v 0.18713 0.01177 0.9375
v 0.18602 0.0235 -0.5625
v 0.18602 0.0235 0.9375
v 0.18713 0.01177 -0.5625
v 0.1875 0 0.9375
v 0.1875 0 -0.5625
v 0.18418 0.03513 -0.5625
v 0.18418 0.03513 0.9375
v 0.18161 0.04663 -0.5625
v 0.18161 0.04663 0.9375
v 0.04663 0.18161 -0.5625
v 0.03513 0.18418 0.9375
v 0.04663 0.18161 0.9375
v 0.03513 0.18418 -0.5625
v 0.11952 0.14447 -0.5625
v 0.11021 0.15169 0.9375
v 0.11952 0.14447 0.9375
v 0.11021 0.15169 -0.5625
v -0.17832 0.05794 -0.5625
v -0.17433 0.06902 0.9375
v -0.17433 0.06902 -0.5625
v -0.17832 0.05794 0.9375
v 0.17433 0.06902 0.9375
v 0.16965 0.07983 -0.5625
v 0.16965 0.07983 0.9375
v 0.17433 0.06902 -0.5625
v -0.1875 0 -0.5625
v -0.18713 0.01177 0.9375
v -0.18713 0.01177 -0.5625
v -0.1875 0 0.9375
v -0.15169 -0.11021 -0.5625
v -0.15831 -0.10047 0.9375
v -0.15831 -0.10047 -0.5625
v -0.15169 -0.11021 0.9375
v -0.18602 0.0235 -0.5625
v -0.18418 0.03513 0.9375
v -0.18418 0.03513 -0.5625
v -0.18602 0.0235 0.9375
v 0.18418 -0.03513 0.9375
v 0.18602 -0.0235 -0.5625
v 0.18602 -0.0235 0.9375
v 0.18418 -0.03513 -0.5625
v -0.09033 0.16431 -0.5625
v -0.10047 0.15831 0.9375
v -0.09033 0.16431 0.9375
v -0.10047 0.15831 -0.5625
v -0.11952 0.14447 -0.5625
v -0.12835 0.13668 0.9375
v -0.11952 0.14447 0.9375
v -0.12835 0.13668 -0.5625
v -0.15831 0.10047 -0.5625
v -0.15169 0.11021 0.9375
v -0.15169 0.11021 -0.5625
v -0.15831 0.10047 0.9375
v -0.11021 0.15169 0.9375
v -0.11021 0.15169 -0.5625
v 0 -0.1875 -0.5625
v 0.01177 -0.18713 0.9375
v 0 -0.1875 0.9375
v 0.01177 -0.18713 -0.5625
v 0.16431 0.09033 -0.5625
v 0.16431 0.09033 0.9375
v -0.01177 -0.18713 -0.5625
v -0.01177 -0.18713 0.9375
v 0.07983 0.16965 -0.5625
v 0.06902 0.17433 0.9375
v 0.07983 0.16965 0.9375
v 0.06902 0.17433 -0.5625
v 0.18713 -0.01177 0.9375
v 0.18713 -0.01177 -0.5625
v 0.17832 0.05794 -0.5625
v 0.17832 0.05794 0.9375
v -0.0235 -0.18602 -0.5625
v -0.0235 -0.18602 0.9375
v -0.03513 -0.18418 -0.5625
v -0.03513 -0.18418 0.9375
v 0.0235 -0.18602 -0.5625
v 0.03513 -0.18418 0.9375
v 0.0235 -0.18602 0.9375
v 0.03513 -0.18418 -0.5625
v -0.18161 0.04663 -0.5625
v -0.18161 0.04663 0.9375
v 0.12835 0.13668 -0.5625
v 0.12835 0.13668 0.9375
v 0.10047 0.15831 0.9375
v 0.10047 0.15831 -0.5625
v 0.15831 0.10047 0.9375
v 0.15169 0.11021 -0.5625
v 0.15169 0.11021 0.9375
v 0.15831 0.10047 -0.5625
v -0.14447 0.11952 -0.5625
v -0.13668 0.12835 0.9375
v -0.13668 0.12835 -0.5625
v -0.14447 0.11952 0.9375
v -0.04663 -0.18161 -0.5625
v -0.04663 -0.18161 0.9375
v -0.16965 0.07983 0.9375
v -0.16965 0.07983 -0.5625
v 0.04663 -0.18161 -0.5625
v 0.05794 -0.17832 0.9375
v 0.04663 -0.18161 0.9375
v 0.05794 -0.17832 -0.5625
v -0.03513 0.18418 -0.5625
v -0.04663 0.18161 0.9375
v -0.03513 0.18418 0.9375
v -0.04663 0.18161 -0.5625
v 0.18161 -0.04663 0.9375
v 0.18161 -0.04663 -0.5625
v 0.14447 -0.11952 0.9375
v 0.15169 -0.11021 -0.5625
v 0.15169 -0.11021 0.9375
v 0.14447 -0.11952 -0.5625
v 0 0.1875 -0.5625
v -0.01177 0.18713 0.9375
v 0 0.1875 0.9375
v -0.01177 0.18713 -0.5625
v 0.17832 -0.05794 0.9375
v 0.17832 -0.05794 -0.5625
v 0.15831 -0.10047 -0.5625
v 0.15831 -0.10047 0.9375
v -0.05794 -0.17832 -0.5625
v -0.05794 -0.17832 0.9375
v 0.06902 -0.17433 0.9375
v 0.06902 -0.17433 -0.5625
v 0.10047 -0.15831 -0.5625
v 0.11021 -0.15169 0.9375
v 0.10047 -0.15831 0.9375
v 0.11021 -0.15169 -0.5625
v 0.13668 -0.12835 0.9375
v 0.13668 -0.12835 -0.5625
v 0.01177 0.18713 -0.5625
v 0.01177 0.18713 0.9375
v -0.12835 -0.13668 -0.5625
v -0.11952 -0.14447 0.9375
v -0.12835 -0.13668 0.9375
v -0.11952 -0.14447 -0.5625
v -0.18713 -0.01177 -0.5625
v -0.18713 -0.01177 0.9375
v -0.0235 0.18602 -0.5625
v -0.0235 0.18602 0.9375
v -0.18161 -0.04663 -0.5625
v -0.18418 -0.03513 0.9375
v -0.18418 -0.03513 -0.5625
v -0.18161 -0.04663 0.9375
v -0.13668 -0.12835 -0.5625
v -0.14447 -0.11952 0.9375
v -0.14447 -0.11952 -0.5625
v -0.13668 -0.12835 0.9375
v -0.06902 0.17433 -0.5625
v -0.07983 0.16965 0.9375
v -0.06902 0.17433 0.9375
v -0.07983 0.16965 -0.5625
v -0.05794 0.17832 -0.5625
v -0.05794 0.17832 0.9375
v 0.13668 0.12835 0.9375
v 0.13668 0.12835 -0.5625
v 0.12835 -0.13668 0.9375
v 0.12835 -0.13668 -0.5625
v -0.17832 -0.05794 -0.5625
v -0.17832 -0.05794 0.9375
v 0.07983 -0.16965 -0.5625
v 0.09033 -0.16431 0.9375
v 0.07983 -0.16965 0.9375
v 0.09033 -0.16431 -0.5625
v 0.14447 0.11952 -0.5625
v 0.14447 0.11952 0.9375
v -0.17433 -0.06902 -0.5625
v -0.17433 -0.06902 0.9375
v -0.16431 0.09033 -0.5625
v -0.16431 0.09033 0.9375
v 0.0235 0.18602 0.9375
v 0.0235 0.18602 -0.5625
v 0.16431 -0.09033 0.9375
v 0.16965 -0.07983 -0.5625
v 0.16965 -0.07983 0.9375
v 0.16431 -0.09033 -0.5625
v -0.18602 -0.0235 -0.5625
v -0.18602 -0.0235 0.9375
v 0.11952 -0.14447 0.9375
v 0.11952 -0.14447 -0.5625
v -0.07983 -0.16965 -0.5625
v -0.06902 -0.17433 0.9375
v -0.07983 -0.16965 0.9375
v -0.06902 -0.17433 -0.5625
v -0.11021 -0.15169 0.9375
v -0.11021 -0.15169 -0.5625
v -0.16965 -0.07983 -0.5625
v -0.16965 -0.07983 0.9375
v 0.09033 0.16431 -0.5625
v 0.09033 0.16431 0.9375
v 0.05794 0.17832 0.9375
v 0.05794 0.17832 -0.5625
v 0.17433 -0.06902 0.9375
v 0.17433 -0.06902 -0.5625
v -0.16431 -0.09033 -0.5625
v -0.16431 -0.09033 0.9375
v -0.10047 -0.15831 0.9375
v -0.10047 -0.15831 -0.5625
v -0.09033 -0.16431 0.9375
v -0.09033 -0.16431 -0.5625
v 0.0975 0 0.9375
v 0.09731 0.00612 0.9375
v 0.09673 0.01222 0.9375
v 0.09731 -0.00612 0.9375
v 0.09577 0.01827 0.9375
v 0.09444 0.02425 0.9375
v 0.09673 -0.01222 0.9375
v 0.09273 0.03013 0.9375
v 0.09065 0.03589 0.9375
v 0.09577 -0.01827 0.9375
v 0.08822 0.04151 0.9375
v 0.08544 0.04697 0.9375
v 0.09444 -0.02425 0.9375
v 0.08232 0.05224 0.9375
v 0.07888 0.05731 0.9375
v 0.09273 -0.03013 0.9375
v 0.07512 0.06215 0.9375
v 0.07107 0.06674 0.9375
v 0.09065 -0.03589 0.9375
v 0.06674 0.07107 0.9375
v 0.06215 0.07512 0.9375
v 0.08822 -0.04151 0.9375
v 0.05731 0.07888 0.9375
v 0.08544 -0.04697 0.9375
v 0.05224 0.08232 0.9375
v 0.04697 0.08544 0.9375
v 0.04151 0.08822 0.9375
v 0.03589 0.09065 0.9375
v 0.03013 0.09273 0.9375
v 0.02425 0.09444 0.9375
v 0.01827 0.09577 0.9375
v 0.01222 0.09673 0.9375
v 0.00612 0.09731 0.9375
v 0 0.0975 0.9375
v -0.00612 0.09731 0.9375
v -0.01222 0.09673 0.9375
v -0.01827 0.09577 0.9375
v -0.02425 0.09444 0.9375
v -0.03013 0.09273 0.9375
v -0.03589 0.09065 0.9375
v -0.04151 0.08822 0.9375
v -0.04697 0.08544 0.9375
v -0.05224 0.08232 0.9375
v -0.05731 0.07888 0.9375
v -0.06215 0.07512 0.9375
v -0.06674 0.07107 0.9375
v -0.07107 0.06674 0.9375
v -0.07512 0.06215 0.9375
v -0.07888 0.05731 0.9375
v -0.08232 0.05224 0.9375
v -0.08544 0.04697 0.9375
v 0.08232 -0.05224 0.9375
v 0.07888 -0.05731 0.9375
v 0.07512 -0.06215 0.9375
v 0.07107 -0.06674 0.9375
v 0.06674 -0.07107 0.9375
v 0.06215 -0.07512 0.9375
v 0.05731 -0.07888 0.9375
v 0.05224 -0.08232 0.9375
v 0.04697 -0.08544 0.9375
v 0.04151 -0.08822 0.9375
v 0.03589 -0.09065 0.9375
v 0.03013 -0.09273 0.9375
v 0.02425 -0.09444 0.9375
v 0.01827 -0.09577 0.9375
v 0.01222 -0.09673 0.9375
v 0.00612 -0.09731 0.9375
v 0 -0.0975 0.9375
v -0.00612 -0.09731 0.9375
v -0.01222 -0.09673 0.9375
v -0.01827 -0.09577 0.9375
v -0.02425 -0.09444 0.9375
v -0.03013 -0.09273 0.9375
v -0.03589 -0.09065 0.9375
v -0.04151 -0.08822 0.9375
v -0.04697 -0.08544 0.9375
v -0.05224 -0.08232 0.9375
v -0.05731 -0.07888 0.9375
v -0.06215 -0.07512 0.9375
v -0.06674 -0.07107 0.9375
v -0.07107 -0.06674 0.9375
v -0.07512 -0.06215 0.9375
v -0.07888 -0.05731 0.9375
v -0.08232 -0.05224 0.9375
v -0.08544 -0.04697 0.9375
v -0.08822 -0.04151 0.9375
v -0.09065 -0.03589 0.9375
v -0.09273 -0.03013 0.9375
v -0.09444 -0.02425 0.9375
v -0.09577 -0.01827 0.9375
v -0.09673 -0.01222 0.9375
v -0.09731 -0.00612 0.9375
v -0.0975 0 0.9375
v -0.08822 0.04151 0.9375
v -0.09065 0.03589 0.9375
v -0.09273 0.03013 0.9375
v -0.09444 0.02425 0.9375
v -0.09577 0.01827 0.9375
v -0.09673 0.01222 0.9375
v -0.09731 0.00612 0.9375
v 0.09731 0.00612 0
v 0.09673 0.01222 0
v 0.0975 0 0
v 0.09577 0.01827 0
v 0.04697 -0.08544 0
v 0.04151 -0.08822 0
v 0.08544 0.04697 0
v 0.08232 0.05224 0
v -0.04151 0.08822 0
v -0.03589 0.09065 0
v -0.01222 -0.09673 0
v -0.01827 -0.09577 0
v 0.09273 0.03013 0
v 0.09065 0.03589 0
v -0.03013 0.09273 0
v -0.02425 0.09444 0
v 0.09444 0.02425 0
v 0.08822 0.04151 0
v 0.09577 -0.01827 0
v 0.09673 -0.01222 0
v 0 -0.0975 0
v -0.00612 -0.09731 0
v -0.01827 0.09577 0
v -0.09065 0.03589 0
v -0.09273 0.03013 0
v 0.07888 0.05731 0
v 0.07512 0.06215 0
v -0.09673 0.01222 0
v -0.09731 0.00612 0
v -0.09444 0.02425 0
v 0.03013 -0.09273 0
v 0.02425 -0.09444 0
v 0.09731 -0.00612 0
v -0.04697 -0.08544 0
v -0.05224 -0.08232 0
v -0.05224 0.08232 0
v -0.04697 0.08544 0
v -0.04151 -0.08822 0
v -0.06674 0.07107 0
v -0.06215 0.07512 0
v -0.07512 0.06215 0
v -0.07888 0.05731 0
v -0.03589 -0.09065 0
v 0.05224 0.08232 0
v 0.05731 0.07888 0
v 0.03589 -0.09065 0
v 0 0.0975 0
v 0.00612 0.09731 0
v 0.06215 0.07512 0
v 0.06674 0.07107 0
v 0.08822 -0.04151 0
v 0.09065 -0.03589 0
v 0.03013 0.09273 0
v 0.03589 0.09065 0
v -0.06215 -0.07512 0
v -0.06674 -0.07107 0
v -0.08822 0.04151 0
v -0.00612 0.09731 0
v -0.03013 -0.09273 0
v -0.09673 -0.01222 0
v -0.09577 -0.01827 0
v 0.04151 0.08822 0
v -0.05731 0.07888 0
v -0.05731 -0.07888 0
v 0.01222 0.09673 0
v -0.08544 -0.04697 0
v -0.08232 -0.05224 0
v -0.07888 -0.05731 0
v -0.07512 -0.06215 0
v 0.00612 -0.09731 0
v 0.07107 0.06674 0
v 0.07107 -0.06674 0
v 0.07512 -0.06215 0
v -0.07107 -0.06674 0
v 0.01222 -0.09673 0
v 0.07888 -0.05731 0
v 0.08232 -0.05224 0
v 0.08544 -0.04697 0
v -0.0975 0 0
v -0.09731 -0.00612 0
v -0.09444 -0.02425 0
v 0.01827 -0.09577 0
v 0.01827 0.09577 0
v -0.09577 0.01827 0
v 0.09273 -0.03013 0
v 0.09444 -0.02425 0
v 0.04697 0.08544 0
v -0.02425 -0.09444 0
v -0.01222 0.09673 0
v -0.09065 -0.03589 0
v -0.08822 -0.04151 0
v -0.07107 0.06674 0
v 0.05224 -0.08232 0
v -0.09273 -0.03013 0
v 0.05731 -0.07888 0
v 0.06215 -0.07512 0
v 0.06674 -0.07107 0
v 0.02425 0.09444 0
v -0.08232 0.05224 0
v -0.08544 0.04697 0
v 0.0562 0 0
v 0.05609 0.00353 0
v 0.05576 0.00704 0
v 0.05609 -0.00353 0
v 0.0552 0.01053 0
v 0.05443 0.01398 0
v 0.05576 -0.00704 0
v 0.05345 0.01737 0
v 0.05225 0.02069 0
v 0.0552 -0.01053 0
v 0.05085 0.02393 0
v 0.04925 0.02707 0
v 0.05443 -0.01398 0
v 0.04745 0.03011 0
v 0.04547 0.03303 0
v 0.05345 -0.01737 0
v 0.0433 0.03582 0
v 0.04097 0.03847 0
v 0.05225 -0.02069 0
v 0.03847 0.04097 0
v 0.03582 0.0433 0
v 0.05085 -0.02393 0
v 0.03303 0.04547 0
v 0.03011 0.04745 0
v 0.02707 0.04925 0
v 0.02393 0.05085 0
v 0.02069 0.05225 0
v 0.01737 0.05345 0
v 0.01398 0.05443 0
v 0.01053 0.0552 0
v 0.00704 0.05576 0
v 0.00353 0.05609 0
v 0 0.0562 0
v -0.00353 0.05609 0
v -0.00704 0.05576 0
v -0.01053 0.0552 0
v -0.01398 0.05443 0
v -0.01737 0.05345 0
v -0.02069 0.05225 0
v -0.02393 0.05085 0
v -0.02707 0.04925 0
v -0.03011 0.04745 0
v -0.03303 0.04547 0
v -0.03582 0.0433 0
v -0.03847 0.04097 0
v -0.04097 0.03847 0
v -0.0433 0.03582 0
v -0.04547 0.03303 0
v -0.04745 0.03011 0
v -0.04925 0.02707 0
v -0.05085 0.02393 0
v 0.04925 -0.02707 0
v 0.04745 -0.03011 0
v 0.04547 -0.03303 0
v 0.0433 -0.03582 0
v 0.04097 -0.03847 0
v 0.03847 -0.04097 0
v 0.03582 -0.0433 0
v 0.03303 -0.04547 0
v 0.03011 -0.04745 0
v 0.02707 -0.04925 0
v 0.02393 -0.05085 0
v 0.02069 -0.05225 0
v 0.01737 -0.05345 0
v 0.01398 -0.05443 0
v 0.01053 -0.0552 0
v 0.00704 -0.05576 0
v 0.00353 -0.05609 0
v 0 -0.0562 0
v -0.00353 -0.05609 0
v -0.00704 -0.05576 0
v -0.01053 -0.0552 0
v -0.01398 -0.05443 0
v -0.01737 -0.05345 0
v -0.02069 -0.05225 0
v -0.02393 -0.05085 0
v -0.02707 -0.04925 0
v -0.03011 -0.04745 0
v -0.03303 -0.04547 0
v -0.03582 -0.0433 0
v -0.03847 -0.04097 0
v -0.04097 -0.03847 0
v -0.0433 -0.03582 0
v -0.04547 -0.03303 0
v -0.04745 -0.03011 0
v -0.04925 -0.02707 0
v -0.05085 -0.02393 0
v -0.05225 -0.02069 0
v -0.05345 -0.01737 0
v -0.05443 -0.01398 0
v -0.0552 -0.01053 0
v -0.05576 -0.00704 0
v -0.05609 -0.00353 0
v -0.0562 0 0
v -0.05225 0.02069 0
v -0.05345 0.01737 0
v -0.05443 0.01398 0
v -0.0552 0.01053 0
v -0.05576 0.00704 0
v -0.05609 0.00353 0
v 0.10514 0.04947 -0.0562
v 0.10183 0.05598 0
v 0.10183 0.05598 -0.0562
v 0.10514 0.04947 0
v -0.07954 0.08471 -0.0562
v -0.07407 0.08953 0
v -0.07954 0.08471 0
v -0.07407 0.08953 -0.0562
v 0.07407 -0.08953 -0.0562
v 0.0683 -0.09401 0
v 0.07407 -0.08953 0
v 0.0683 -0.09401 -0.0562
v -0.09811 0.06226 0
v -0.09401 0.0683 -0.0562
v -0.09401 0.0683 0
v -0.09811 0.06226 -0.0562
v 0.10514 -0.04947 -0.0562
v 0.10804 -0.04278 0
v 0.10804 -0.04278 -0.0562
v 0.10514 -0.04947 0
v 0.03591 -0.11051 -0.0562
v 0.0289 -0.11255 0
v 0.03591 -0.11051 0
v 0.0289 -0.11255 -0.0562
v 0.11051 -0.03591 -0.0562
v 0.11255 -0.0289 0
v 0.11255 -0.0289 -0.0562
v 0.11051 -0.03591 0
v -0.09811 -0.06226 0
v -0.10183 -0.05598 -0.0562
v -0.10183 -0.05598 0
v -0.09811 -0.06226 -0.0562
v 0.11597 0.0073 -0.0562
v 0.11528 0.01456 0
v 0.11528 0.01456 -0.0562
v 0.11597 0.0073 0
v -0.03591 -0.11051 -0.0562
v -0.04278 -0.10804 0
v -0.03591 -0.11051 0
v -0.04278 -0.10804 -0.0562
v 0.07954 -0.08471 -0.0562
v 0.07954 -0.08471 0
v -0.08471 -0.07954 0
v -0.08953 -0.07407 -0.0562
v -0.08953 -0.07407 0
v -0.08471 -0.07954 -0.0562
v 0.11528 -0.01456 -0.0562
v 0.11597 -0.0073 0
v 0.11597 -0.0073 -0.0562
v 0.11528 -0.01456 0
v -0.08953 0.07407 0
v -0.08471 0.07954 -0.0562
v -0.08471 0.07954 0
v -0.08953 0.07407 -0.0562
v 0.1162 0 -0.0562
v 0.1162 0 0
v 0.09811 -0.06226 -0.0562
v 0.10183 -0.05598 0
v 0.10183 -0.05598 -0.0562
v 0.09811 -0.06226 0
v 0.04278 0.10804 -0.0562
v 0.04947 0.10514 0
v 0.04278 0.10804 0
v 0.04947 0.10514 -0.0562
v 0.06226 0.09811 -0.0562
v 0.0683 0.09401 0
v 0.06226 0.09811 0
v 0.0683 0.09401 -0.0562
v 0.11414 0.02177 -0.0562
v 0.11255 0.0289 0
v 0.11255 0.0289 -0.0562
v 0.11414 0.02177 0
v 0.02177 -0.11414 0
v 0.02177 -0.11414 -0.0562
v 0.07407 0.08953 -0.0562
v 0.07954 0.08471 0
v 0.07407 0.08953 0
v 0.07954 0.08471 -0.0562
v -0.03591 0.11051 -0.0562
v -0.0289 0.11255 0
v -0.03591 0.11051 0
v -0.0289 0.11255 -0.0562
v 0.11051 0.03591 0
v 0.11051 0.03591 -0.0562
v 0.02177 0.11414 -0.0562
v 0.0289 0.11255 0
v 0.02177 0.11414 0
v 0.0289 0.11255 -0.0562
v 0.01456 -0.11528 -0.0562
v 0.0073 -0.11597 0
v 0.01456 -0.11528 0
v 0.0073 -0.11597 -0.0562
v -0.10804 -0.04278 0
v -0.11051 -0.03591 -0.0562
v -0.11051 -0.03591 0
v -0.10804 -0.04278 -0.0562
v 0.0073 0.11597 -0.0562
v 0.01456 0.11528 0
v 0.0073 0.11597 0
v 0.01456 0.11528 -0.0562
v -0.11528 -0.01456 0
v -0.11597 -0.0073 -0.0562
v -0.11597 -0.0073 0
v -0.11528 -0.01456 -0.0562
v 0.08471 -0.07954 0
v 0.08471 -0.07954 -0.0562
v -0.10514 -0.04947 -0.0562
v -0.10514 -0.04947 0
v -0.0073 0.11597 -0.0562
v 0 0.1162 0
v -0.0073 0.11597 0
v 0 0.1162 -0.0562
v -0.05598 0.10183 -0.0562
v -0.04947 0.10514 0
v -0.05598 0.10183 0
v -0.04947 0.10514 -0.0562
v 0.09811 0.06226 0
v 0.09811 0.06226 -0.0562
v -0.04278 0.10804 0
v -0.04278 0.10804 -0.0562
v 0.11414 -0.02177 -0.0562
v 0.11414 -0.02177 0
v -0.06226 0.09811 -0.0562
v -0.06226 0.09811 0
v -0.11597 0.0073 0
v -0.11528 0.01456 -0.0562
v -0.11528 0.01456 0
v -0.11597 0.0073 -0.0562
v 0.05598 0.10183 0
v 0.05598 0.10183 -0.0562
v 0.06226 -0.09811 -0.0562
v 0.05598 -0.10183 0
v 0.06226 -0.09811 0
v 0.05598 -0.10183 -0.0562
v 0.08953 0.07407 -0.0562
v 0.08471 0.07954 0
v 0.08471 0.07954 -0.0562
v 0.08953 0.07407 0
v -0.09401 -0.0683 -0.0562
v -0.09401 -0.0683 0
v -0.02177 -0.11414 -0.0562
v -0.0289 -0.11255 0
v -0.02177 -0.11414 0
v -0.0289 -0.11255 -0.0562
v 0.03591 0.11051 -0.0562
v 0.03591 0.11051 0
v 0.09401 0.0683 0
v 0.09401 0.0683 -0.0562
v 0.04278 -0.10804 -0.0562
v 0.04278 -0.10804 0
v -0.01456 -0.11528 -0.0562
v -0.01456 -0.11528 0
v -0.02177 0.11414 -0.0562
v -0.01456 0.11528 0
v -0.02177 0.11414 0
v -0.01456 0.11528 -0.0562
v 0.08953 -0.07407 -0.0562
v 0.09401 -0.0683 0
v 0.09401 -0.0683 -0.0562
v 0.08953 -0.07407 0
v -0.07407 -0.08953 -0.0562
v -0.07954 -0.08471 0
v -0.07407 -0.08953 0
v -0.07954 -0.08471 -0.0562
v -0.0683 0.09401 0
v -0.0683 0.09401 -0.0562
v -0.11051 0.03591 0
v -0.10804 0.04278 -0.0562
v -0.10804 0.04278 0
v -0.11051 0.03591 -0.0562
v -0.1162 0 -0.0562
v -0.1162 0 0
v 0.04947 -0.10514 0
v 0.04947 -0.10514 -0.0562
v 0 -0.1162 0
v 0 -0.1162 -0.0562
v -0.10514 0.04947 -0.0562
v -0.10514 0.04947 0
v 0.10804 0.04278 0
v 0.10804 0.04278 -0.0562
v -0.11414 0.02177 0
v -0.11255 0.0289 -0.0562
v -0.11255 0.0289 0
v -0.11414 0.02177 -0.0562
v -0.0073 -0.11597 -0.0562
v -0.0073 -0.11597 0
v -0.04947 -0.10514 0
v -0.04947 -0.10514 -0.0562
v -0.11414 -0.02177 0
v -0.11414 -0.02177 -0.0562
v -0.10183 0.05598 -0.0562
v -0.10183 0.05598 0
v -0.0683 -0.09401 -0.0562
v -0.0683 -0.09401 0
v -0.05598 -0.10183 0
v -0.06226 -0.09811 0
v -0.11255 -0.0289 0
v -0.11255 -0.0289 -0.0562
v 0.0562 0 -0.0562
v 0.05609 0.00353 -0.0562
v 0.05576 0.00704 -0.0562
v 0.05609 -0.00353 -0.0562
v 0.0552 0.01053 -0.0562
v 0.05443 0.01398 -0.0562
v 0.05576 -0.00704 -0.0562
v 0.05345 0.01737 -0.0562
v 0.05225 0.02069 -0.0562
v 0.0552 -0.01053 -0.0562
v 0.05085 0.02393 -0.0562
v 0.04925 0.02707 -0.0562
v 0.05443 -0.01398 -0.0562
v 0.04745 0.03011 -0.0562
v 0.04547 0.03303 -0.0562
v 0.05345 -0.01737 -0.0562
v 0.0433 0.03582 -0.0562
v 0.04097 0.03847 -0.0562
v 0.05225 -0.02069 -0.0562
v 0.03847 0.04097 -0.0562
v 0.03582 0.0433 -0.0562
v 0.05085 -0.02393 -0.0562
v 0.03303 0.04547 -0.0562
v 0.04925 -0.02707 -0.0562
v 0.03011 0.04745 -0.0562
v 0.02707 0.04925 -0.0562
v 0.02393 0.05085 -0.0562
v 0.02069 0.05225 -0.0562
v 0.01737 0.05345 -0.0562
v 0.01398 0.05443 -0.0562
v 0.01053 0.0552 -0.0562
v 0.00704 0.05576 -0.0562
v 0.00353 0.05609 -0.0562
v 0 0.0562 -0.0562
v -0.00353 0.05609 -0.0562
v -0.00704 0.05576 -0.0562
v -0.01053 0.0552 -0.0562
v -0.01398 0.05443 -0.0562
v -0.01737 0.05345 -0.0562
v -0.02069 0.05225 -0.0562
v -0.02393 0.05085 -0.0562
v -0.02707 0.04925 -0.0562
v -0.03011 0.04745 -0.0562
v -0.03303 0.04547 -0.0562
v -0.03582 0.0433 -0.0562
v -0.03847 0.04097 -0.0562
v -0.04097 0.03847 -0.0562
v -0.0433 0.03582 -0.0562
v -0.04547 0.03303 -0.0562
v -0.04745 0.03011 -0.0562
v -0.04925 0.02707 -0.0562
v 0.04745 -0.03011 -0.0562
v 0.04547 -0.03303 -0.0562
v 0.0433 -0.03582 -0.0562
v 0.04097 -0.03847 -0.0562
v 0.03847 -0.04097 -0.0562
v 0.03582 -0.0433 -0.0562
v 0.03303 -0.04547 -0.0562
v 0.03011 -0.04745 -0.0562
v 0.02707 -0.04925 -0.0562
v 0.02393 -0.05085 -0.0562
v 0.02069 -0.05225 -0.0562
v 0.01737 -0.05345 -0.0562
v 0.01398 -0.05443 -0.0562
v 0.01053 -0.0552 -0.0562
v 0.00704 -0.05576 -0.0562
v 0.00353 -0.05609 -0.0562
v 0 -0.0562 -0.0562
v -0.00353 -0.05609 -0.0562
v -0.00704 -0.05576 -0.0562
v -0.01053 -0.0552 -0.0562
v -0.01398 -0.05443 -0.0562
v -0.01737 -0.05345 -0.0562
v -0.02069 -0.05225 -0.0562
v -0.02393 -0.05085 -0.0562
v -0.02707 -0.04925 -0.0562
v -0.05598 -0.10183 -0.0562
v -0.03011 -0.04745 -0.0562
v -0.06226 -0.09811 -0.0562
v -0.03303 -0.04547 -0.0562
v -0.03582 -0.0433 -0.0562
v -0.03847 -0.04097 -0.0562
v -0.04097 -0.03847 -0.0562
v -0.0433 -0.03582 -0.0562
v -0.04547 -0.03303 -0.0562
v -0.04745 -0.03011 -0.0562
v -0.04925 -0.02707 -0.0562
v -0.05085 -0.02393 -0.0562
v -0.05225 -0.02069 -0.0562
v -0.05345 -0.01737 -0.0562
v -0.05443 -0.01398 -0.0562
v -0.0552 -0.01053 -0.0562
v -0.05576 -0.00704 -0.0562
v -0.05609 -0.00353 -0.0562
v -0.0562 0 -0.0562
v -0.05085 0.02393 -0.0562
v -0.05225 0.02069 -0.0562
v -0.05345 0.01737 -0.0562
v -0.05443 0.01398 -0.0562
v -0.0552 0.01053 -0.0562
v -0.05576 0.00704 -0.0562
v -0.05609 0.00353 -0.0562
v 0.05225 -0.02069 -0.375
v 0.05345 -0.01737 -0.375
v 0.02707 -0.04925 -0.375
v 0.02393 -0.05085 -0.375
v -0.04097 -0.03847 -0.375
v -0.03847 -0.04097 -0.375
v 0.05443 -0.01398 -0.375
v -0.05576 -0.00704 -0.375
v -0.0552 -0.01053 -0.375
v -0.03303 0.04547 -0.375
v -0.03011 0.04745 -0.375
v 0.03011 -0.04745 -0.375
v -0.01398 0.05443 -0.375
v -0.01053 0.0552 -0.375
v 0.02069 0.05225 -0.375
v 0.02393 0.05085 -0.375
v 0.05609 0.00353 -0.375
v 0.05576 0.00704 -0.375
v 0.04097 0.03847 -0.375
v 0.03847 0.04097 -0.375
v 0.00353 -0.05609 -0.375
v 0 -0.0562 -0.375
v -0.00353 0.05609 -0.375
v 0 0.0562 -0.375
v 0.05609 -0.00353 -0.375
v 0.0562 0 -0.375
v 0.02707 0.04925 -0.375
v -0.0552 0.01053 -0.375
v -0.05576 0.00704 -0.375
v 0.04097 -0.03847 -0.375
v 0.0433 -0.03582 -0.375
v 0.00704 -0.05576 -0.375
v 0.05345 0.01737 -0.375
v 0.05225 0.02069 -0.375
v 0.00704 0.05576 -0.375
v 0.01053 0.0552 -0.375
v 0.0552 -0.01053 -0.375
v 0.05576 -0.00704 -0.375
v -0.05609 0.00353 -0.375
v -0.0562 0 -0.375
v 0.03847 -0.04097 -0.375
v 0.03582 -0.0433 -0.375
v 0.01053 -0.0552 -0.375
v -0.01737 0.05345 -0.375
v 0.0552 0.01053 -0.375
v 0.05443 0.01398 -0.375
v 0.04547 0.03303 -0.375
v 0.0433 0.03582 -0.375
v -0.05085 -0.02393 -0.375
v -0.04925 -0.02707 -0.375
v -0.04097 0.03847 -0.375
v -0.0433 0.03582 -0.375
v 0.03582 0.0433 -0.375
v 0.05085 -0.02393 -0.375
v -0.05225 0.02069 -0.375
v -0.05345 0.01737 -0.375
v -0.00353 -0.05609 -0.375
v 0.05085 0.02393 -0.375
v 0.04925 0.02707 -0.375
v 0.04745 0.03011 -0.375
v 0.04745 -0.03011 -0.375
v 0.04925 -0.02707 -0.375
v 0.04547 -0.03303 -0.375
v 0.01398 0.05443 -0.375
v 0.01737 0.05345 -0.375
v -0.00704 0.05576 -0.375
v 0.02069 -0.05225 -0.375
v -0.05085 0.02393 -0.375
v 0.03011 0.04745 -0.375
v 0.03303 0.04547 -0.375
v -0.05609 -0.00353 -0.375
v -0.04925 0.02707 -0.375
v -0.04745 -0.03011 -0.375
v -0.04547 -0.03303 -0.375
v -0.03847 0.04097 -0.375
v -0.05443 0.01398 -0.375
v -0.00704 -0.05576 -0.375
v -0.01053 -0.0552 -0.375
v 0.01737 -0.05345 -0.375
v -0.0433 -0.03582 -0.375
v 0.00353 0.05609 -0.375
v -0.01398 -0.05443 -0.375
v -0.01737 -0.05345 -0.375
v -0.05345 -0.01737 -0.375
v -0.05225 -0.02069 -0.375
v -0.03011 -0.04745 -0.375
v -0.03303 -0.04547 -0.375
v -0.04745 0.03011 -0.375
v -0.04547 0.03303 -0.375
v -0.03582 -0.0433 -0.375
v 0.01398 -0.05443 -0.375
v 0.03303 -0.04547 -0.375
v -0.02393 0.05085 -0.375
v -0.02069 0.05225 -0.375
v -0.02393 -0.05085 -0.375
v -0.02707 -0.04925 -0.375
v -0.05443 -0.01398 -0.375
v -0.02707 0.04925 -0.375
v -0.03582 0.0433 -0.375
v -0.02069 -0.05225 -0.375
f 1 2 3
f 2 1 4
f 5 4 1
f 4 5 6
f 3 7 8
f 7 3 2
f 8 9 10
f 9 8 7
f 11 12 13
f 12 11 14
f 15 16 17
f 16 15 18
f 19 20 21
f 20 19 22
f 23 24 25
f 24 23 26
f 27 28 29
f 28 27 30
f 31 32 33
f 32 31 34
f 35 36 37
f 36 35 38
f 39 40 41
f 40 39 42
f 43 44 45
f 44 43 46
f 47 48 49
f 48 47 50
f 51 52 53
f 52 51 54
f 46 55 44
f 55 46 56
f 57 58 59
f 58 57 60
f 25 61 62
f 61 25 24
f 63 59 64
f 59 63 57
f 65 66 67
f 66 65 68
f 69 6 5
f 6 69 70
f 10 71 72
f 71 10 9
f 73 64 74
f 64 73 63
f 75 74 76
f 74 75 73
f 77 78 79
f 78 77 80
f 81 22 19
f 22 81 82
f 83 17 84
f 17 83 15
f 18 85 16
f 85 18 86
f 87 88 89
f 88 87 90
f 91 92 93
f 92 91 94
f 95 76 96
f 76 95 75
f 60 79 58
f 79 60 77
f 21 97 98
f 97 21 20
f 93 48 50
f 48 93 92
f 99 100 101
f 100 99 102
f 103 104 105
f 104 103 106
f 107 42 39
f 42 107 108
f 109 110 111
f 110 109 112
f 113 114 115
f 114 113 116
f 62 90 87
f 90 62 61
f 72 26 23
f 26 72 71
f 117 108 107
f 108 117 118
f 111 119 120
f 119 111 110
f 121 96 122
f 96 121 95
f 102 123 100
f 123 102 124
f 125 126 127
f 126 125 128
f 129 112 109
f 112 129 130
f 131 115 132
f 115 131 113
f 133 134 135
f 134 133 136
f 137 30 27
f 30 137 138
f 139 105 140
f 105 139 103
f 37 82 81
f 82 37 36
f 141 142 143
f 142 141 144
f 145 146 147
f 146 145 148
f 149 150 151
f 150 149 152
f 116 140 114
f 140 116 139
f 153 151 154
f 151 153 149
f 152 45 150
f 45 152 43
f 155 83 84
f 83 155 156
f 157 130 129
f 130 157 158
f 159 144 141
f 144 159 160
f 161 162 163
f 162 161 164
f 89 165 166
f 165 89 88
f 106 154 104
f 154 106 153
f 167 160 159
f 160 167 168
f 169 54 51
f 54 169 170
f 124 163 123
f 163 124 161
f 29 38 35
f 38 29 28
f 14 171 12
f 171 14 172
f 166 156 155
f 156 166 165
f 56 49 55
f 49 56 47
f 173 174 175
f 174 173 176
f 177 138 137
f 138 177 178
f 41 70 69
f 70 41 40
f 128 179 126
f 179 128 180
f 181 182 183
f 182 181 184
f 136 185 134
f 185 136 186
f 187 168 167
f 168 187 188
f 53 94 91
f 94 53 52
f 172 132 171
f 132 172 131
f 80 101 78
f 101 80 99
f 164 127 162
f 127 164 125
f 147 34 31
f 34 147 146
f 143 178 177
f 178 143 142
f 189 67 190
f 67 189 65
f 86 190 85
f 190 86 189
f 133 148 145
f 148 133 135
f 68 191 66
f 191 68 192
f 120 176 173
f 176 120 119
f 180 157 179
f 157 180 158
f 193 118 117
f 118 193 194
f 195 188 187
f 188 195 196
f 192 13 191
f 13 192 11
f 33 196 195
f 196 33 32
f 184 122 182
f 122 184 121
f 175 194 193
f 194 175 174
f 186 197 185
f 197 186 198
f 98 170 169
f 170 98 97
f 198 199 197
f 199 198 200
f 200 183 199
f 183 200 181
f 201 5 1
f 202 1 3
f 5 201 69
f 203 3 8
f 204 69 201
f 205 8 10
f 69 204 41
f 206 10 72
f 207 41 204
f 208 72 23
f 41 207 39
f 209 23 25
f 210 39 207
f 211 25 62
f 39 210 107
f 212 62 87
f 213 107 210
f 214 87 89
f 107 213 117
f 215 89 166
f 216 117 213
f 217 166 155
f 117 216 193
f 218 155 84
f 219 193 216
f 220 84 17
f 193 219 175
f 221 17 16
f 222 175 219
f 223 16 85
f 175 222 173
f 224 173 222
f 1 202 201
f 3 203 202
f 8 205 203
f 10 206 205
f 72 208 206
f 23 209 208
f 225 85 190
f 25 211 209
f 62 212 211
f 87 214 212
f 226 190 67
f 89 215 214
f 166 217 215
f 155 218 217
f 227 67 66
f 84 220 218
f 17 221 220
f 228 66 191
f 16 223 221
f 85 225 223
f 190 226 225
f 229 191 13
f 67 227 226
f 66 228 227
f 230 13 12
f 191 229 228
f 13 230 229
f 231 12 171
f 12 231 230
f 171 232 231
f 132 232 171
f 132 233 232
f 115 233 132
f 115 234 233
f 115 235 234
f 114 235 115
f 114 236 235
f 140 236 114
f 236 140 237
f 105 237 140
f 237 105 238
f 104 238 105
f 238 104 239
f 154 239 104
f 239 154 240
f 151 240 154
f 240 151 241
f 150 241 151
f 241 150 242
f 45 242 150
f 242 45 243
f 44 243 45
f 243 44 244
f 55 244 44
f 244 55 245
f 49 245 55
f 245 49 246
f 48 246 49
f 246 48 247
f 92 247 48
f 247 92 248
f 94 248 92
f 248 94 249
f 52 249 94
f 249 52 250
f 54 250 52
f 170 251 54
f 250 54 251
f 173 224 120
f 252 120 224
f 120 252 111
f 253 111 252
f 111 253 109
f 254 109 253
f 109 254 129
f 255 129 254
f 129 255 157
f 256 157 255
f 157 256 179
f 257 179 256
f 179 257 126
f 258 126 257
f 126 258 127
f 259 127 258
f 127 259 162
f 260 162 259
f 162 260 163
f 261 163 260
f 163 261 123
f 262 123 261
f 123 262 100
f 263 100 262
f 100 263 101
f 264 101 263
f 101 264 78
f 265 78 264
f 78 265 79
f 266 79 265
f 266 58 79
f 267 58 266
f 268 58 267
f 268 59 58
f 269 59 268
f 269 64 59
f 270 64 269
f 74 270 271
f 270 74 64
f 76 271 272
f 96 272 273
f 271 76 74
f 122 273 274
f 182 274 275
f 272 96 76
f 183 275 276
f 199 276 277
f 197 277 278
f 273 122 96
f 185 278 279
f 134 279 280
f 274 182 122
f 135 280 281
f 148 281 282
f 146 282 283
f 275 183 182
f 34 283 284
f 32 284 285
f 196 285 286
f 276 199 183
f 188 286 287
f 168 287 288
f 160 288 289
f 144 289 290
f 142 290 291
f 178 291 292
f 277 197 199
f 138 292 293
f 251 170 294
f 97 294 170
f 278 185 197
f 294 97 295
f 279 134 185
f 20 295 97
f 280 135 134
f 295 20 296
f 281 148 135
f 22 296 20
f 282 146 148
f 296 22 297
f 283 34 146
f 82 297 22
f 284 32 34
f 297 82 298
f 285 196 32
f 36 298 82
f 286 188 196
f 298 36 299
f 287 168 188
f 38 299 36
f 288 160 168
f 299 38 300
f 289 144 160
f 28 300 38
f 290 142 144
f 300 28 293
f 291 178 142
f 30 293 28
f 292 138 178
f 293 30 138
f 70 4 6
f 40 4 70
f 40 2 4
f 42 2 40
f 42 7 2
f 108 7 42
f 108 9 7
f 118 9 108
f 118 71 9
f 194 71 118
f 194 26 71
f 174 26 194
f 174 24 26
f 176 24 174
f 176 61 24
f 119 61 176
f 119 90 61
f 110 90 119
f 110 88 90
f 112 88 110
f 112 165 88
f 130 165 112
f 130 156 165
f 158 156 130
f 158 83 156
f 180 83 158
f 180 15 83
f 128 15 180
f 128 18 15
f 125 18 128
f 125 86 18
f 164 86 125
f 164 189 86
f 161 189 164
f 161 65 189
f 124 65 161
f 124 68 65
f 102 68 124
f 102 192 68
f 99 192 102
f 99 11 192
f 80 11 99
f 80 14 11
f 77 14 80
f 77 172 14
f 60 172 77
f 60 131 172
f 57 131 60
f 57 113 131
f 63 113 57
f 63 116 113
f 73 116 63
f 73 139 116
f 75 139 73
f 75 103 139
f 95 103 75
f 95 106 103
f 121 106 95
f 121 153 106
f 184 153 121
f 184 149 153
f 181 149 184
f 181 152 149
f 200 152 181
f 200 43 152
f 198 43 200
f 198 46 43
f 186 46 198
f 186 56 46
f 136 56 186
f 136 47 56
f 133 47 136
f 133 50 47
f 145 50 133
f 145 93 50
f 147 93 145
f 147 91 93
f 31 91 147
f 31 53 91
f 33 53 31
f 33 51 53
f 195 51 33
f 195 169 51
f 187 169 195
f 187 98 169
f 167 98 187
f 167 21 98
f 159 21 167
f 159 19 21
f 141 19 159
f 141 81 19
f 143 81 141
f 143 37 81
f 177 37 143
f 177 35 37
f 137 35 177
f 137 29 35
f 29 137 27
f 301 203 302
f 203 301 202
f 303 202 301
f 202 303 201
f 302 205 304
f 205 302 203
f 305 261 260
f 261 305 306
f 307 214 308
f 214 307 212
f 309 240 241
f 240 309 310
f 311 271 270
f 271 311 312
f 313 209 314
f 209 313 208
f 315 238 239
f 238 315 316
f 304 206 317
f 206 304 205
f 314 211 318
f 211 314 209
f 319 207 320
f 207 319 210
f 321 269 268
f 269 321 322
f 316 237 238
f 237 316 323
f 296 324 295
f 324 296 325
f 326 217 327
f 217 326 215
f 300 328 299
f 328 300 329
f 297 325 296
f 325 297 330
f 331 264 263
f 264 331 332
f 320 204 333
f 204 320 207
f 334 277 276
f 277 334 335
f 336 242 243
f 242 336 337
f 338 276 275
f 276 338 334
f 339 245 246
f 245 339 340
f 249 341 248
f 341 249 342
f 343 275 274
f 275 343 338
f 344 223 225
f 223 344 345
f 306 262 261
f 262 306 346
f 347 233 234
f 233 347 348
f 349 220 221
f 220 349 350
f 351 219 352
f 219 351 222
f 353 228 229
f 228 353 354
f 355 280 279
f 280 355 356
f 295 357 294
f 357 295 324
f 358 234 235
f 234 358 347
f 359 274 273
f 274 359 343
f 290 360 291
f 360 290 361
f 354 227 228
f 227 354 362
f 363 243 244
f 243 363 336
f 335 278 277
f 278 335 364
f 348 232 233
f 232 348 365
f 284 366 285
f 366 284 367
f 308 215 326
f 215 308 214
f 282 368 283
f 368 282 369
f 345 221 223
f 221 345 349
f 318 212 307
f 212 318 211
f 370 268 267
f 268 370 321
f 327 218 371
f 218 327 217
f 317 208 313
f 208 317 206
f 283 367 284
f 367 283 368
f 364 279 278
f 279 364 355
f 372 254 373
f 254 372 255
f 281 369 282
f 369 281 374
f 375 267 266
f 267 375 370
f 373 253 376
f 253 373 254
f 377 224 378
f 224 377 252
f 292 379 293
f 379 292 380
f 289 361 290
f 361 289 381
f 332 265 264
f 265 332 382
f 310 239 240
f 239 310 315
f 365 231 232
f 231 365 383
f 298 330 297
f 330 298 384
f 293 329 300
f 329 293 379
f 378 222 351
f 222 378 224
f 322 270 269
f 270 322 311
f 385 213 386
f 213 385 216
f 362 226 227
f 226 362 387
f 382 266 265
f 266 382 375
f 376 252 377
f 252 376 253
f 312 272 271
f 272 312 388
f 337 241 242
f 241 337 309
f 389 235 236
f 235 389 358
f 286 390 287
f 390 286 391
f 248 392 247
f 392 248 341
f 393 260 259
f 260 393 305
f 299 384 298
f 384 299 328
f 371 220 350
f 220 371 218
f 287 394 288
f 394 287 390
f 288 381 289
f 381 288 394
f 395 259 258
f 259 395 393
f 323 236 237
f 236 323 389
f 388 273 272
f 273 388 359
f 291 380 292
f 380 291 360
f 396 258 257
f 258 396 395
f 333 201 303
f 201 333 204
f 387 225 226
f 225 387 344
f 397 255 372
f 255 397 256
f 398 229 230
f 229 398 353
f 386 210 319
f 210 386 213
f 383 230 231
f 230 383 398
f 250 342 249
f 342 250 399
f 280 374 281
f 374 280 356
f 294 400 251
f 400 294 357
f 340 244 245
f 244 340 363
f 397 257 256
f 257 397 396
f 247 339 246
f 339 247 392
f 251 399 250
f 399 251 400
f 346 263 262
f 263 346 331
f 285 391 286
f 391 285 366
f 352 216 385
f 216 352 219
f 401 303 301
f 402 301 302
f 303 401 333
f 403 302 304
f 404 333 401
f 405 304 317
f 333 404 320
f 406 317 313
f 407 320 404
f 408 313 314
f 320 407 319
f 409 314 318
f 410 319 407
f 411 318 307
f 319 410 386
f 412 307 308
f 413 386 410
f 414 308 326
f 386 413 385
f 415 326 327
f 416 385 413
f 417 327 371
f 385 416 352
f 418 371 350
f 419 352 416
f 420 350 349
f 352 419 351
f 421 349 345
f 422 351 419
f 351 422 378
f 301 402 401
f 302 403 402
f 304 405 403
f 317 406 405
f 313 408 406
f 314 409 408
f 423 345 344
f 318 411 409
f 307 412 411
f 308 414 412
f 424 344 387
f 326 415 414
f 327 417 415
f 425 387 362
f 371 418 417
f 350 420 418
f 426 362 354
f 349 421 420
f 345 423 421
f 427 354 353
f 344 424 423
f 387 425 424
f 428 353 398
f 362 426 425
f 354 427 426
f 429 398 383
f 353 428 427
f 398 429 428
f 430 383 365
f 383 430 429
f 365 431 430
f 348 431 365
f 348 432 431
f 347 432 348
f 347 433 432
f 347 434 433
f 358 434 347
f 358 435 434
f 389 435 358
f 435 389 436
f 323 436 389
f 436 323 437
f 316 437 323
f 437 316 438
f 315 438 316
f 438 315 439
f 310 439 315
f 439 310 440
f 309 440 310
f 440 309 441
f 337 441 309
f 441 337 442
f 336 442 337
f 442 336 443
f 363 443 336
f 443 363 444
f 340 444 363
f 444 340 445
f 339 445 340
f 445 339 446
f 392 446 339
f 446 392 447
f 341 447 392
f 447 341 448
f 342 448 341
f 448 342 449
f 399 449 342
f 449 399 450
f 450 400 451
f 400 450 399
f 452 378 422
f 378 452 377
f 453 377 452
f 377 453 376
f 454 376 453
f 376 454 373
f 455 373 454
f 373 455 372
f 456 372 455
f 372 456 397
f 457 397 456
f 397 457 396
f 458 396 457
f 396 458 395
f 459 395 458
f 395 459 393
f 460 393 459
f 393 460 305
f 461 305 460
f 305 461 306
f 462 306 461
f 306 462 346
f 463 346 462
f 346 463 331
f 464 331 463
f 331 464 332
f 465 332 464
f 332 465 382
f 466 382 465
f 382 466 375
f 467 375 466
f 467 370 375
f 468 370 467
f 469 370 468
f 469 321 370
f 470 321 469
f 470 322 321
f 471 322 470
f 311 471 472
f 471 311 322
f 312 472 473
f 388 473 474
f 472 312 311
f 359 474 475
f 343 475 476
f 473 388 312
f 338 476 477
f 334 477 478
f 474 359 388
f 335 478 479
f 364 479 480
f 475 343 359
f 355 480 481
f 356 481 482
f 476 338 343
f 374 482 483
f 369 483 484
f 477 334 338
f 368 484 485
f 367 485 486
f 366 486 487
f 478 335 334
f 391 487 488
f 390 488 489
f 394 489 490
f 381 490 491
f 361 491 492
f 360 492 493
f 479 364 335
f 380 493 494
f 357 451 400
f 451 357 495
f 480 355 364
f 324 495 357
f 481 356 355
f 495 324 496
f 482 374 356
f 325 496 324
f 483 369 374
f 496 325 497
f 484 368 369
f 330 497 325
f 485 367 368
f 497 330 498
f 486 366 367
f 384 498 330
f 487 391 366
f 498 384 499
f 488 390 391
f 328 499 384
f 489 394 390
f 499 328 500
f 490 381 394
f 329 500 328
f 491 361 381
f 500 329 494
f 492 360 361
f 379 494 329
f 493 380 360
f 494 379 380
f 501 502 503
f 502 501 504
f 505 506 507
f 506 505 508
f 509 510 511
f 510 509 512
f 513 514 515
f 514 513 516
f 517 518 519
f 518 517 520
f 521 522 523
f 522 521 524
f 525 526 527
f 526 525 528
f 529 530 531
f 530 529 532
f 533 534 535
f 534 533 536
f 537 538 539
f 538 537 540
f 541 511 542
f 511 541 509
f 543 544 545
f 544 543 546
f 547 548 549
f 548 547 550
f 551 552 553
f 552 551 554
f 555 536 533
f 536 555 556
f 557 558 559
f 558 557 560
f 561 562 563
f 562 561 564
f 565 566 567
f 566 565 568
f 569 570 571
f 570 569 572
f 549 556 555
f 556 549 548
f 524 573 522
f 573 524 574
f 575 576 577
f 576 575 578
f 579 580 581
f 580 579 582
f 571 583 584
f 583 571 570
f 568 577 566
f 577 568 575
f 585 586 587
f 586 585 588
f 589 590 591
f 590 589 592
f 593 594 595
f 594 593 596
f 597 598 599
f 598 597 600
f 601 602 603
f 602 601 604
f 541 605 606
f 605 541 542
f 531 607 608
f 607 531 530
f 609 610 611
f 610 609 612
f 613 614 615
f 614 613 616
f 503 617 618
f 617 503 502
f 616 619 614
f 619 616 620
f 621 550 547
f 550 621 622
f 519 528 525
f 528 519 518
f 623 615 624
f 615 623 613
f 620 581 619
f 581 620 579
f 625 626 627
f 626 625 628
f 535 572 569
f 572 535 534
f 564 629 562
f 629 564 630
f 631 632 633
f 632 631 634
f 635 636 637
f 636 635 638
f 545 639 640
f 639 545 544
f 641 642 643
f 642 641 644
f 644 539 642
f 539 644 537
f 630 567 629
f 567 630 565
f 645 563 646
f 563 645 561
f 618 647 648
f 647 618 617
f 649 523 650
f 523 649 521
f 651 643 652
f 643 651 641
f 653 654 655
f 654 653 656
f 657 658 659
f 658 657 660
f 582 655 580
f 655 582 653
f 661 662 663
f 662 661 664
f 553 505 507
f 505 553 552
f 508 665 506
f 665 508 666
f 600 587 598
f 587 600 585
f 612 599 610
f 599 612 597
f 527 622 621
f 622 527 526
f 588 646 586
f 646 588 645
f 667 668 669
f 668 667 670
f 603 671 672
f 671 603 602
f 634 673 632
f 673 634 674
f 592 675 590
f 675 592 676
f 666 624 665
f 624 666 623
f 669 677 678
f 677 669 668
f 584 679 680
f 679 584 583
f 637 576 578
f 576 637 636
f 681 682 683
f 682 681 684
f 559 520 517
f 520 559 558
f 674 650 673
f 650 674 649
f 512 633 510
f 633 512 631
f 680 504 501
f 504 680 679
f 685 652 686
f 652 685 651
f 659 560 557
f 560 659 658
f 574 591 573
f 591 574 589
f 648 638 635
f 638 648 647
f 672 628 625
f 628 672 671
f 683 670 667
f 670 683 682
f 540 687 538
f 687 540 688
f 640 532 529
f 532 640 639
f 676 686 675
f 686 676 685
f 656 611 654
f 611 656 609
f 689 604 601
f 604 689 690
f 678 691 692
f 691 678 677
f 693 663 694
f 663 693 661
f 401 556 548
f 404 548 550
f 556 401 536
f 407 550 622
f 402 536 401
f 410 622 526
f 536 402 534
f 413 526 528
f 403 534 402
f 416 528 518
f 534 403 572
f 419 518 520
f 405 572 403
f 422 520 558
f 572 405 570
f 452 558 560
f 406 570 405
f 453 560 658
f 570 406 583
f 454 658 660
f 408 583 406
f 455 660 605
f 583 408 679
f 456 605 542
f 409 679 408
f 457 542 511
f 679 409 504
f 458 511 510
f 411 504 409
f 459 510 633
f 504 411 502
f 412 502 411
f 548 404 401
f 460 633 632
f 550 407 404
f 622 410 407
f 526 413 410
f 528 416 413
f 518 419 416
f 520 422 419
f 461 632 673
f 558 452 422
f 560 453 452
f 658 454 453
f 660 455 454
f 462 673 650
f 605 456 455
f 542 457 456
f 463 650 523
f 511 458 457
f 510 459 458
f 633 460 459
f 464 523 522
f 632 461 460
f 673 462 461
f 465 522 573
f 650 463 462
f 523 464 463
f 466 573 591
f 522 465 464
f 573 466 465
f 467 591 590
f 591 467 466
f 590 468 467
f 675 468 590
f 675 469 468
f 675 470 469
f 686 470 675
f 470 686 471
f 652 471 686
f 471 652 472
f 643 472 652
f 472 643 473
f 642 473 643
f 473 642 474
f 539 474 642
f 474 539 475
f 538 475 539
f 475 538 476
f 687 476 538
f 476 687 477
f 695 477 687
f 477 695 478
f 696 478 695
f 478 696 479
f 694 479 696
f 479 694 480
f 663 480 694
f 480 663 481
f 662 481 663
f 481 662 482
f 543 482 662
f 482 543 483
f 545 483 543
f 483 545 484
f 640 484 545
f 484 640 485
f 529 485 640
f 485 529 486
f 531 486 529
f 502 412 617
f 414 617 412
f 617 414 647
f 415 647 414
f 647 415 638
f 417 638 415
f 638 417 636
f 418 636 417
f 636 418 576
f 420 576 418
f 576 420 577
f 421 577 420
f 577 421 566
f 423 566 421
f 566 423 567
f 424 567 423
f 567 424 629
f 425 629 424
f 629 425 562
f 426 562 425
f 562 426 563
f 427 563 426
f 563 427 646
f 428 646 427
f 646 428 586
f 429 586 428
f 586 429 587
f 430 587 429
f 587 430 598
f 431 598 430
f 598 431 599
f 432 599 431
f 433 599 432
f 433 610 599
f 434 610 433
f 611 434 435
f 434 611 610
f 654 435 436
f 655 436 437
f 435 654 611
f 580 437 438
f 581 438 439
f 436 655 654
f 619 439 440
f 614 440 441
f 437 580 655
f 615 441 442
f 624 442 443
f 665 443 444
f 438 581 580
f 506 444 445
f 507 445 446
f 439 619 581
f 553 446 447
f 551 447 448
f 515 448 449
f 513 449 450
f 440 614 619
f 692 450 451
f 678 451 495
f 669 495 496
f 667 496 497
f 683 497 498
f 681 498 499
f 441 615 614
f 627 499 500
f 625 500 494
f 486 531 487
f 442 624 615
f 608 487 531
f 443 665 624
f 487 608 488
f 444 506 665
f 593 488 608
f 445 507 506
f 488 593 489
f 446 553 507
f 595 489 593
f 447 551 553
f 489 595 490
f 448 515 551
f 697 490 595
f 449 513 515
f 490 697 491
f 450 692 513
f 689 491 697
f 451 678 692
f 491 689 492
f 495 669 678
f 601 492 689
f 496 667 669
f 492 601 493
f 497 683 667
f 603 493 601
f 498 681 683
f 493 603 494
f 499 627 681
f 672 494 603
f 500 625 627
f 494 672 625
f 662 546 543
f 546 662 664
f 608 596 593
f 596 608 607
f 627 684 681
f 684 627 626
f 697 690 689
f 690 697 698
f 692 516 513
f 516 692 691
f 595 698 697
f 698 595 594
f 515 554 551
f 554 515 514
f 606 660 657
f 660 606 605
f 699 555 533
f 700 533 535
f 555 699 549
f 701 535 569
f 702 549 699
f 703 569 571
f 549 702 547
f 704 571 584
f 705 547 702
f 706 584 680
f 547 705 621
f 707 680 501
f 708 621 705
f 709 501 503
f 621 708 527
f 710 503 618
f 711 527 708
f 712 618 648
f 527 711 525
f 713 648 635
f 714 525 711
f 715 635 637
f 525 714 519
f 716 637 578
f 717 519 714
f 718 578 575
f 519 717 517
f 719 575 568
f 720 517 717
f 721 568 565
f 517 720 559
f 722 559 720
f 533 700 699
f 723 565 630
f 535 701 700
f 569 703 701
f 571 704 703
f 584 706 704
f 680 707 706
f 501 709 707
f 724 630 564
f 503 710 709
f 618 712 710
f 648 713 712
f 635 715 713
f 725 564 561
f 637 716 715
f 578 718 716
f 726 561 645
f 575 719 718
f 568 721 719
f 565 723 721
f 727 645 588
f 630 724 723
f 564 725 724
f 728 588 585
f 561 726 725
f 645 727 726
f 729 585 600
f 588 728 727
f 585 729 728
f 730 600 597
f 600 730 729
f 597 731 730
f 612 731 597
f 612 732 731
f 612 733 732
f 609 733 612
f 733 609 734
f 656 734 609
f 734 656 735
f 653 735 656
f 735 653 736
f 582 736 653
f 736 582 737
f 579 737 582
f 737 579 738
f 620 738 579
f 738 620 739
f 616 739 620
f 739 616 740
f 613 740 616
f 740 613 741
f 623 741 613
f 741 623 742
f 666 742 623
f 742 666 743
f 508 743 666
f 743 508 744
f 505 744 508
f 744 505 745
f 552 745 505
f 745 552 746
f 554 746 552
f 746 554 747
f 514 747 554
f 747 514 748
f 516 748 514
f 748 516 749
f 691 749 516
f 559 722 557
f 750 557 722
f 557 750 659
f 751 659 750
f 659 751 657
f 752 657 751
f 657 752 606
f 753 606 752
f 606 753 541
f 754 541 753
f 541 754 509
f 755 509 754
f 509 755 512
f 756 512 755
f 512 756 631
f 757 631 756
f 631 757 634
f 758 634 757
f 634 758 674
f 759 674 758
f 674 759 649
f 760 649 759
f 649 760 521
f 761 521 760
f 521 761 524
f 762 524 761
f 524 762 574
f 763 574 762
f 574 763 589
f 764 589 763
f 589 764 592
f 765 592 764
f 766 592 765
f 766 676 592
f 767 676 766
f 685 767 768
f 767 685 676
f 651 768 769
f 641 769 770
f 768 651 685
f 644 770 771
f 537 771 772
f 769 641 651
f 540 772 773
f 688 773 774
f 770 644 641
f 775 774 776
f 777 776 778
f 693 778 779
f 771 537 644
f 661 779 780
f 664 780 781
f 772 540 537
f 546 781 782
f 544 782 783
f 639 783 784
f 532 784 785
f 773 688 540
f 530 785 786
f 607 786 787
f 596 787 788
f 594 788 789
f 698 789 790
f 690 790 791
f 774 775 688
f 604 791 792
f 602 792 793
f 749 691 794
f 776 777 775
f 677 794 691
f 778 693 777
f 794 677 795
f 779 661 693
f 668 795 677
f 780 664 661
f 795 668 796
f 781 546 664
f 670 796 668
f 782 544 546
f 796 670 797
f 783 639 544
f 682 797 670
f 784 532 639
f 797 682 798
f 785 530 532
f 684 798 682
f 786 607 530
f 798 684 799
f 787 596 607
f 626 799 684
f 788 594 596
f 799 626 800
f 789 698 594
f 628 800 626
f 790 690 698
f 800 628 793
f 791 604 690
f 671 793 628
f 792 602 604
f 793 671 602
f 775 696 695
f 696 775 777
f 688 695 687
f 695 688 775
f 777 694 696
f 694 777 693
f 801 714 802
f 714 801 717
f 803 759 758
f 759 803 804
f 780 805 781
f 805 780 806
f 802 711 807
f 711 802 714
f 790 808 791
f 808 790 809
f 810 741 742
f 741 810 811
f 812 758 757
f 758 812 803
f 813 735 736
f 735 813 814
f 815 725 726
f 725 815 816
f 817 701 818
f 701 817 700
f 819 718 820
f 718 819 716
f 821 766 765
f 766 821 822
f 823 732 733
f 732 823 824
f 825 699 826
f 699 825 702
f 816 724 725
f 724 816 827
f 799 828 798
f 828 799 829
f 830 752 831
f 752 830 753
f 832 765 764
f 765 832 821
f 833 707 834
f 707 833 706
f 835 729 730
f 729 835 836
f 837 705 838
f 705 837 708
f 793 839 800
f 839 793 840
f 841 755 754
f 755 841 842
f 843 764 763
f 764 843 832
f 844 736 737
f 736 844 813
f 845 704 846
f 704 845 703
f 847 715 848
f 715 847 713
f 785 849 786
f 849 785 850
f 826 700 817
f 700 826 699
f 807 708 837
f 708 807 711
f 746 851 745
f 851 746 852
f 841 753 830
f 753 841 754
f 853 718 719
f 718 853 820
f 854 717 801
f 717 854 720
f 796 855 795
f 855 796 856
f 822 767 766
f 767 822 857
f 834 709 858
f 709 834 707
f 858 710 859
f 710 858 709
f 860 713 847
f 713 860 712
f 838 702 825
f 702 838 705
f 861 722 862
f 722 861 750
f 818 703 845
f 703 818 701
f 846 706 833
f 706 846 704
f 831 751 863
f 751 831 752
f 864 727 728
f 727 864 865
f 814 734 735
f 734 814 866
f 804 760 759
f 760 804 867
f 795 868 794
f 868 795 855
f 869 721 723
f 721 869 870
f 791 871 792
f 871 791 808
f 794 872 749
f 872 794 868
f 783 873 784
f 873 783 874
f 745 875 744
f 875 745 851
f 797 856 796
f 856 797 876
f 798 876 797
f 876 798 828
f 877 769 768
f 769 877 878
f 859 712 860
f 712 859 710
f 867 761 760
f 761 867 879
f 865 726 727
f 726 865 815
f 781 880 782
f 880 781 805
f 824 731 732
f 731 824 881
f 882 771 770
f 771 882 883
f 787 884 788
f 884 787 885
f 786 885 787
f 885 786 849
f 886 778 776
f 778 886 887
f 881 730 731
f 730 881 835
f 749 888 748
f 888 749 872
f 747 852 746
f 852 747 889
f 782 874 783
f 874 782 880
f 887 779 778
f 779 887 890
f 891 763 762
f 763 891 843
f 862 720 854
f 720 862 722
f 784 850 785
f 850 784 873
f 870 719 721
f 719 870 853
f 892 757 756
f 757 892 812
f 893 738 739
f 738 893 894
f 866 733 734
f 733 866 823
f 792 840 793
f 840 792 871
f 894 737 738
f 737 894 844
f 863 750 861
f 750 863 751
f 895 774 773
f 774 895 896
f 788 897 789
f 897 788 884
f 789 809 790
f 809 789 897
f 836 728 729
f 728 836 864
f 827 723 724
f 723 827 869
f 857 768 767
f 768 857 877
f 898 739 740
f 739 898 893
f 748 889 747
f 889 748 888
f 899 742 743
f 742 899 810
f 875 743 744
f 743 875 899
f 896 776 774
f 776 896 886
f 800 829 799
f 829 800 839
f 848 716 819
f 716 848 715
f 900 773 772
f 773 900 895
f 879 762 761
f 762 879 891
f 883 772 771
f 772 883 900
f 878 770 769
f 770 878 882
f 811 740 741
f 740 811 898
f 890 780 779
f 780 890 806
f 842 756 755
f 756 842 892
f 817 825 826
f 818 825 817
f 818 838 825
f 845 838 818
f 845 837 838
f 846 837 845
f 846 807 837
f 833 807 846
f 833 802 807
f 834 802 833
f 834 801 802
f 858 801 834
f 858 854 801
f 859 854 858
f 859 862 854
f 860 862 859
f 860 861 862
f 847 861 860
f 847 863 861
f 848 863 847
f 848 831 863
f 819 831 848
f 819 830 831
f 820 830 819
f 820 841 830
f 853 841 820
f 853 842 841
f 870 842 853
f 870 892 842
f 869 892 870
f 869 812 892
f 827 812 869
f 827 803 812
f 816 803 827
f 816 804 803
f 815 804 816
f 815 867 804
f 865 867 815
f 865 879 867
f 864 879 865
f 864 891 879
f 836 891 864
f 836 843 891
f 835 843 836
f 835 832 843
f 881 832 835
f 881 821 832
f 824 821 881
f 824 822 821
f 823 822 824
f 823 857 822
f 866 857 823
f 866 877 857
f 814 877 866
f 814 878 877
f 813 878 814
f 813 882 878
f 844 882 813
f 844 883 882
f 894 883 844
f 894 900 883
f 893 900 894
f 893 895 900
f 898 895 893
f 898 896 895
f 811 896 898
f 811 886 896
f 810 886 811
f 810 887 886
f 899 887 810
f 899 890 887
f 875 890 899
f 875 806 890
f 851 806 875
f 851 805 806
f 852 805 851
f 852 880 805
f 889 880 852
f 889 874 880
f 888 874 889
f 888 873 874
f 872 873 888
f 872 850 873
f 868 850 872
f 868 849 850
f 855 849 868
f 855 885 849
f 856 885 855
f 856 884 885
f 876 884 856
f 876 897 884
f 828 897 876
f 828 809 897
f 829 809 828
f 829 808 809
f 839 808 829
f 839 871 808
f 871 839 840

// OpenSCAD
// Parametric stepped cylindrical part with shared shoulder at Z=0
$fn = 100;

// --- Main solid dimensions ---
POS_RADIUS = 0.1875;          // Radius of positive-side round sections
NEG_RADIUS = 0.1875;          // Radius of negative-side round section
POS_REACH_PRIMARY = 0.5625;   // Upper solid section reach from shoulder
POS_REACH_TOTAL = 0.9375;     // Extended positive reach to enclose deepest voids
NEG_REACH = 0.5625;           // Negative solid section reach from shoulder

// --- Positive side voids ---
POS_HOLE_LARGE_R = 0.0975;    // Larger circular removal radius
POS_HOLE_SMALL_R = 0.0534;    // Smaller separate circular removal radius
POS_HOLE_REACH = 0.9375;      // Reach of both positive holes from shoulder

// --- Negative side voids ---
NEG_HOLE_R = 0.0562;          // Central circular removal radius
NEG_HOLE_REACH = 0.375;       // Reach of central hole from shoulder

NEG_RECESS1_OR = 0.1162;      // Outer radius of first annular recess
NEG_RECESS1_IR = 0.0562;      // Inner radius of first annular recess
NEG_RECESS2_OR = 0.075;       // Outer radius of second annular recess
NEG_RECESS2_IR = 0.0562;      // Inner radius of second annular recess
NEG_RECESS_REACH = 0.0562;    // Reach of both shallow annular recesses from shoulder

// --- Main body: union of positive and negative round solids ---
module body() {
    union() {
        // Explicit upper round solid section per specification
        cylinder(h = POS_REACH_PRIMARY, r = POS_RADIUS);
        // Extension to contain positive-side holes reaching 0.9375
        cylinder(h = POS_REACH_TOTAL, r = POS_RADIUS);
        // Second attached solid circular section on negative side
        translate([0, 0, -NEG_REACH])
            cylinder(h = NEG_REACH, r = NEG_RADIUS);
    }
}

// --- Positive side voids: circular removals reaching from shoulder ---
module positive_voids() {
    // Large circular removal
    cylinder(h = POS_HOLE_REACH, r = POS_HOLE_LARGE_R);
    // Smaller separate circular removal (coaxial, nested inside large)
    cylinder(h = POS_HOLE_REACH, r = POS_HOLE_SMALL_R);
}

// --- Negative side voids: central hole and shallow annular recesses ---
module negative_voids() {
    // Central circular removal
    translate([0, 0, -NEG_HOLE_REACH])
        cylinder(h = NEG_HOLE_REACH, r = NEG_HOLE_R);

    // Shallow annular recess 1 (ring between IR and OR)
    translate([0, 0, -NEG_RECESS_REACH])
        difference() {
            cylinder(h = NEG_RECESS_REACH, r = NEG_RECESS1_OR);
            // Slightly taller inner plug to ensure clean subtraction
            cylinder(h = NEG_RECESS_REACH + 0.01, r = NEG_RECESS1_IR);
        }

    // Shallow annular recess 2 (ring between IR and OR)
    translate([0, 0, -NEG_RECESS_REACH])
        difference() {
            cylinder(h = NEG_RECESS_REACH, r = NEG_RECESS2_OR);
            cylinder(h = NEG_RECESS_REACH + 0.01, r = NEG_RECESS2_IR);
        }
}

// --- Build part by subtracting all voids from the main body ---
difference() {
    body();
    positive_voids();
    negative_voids();
}
